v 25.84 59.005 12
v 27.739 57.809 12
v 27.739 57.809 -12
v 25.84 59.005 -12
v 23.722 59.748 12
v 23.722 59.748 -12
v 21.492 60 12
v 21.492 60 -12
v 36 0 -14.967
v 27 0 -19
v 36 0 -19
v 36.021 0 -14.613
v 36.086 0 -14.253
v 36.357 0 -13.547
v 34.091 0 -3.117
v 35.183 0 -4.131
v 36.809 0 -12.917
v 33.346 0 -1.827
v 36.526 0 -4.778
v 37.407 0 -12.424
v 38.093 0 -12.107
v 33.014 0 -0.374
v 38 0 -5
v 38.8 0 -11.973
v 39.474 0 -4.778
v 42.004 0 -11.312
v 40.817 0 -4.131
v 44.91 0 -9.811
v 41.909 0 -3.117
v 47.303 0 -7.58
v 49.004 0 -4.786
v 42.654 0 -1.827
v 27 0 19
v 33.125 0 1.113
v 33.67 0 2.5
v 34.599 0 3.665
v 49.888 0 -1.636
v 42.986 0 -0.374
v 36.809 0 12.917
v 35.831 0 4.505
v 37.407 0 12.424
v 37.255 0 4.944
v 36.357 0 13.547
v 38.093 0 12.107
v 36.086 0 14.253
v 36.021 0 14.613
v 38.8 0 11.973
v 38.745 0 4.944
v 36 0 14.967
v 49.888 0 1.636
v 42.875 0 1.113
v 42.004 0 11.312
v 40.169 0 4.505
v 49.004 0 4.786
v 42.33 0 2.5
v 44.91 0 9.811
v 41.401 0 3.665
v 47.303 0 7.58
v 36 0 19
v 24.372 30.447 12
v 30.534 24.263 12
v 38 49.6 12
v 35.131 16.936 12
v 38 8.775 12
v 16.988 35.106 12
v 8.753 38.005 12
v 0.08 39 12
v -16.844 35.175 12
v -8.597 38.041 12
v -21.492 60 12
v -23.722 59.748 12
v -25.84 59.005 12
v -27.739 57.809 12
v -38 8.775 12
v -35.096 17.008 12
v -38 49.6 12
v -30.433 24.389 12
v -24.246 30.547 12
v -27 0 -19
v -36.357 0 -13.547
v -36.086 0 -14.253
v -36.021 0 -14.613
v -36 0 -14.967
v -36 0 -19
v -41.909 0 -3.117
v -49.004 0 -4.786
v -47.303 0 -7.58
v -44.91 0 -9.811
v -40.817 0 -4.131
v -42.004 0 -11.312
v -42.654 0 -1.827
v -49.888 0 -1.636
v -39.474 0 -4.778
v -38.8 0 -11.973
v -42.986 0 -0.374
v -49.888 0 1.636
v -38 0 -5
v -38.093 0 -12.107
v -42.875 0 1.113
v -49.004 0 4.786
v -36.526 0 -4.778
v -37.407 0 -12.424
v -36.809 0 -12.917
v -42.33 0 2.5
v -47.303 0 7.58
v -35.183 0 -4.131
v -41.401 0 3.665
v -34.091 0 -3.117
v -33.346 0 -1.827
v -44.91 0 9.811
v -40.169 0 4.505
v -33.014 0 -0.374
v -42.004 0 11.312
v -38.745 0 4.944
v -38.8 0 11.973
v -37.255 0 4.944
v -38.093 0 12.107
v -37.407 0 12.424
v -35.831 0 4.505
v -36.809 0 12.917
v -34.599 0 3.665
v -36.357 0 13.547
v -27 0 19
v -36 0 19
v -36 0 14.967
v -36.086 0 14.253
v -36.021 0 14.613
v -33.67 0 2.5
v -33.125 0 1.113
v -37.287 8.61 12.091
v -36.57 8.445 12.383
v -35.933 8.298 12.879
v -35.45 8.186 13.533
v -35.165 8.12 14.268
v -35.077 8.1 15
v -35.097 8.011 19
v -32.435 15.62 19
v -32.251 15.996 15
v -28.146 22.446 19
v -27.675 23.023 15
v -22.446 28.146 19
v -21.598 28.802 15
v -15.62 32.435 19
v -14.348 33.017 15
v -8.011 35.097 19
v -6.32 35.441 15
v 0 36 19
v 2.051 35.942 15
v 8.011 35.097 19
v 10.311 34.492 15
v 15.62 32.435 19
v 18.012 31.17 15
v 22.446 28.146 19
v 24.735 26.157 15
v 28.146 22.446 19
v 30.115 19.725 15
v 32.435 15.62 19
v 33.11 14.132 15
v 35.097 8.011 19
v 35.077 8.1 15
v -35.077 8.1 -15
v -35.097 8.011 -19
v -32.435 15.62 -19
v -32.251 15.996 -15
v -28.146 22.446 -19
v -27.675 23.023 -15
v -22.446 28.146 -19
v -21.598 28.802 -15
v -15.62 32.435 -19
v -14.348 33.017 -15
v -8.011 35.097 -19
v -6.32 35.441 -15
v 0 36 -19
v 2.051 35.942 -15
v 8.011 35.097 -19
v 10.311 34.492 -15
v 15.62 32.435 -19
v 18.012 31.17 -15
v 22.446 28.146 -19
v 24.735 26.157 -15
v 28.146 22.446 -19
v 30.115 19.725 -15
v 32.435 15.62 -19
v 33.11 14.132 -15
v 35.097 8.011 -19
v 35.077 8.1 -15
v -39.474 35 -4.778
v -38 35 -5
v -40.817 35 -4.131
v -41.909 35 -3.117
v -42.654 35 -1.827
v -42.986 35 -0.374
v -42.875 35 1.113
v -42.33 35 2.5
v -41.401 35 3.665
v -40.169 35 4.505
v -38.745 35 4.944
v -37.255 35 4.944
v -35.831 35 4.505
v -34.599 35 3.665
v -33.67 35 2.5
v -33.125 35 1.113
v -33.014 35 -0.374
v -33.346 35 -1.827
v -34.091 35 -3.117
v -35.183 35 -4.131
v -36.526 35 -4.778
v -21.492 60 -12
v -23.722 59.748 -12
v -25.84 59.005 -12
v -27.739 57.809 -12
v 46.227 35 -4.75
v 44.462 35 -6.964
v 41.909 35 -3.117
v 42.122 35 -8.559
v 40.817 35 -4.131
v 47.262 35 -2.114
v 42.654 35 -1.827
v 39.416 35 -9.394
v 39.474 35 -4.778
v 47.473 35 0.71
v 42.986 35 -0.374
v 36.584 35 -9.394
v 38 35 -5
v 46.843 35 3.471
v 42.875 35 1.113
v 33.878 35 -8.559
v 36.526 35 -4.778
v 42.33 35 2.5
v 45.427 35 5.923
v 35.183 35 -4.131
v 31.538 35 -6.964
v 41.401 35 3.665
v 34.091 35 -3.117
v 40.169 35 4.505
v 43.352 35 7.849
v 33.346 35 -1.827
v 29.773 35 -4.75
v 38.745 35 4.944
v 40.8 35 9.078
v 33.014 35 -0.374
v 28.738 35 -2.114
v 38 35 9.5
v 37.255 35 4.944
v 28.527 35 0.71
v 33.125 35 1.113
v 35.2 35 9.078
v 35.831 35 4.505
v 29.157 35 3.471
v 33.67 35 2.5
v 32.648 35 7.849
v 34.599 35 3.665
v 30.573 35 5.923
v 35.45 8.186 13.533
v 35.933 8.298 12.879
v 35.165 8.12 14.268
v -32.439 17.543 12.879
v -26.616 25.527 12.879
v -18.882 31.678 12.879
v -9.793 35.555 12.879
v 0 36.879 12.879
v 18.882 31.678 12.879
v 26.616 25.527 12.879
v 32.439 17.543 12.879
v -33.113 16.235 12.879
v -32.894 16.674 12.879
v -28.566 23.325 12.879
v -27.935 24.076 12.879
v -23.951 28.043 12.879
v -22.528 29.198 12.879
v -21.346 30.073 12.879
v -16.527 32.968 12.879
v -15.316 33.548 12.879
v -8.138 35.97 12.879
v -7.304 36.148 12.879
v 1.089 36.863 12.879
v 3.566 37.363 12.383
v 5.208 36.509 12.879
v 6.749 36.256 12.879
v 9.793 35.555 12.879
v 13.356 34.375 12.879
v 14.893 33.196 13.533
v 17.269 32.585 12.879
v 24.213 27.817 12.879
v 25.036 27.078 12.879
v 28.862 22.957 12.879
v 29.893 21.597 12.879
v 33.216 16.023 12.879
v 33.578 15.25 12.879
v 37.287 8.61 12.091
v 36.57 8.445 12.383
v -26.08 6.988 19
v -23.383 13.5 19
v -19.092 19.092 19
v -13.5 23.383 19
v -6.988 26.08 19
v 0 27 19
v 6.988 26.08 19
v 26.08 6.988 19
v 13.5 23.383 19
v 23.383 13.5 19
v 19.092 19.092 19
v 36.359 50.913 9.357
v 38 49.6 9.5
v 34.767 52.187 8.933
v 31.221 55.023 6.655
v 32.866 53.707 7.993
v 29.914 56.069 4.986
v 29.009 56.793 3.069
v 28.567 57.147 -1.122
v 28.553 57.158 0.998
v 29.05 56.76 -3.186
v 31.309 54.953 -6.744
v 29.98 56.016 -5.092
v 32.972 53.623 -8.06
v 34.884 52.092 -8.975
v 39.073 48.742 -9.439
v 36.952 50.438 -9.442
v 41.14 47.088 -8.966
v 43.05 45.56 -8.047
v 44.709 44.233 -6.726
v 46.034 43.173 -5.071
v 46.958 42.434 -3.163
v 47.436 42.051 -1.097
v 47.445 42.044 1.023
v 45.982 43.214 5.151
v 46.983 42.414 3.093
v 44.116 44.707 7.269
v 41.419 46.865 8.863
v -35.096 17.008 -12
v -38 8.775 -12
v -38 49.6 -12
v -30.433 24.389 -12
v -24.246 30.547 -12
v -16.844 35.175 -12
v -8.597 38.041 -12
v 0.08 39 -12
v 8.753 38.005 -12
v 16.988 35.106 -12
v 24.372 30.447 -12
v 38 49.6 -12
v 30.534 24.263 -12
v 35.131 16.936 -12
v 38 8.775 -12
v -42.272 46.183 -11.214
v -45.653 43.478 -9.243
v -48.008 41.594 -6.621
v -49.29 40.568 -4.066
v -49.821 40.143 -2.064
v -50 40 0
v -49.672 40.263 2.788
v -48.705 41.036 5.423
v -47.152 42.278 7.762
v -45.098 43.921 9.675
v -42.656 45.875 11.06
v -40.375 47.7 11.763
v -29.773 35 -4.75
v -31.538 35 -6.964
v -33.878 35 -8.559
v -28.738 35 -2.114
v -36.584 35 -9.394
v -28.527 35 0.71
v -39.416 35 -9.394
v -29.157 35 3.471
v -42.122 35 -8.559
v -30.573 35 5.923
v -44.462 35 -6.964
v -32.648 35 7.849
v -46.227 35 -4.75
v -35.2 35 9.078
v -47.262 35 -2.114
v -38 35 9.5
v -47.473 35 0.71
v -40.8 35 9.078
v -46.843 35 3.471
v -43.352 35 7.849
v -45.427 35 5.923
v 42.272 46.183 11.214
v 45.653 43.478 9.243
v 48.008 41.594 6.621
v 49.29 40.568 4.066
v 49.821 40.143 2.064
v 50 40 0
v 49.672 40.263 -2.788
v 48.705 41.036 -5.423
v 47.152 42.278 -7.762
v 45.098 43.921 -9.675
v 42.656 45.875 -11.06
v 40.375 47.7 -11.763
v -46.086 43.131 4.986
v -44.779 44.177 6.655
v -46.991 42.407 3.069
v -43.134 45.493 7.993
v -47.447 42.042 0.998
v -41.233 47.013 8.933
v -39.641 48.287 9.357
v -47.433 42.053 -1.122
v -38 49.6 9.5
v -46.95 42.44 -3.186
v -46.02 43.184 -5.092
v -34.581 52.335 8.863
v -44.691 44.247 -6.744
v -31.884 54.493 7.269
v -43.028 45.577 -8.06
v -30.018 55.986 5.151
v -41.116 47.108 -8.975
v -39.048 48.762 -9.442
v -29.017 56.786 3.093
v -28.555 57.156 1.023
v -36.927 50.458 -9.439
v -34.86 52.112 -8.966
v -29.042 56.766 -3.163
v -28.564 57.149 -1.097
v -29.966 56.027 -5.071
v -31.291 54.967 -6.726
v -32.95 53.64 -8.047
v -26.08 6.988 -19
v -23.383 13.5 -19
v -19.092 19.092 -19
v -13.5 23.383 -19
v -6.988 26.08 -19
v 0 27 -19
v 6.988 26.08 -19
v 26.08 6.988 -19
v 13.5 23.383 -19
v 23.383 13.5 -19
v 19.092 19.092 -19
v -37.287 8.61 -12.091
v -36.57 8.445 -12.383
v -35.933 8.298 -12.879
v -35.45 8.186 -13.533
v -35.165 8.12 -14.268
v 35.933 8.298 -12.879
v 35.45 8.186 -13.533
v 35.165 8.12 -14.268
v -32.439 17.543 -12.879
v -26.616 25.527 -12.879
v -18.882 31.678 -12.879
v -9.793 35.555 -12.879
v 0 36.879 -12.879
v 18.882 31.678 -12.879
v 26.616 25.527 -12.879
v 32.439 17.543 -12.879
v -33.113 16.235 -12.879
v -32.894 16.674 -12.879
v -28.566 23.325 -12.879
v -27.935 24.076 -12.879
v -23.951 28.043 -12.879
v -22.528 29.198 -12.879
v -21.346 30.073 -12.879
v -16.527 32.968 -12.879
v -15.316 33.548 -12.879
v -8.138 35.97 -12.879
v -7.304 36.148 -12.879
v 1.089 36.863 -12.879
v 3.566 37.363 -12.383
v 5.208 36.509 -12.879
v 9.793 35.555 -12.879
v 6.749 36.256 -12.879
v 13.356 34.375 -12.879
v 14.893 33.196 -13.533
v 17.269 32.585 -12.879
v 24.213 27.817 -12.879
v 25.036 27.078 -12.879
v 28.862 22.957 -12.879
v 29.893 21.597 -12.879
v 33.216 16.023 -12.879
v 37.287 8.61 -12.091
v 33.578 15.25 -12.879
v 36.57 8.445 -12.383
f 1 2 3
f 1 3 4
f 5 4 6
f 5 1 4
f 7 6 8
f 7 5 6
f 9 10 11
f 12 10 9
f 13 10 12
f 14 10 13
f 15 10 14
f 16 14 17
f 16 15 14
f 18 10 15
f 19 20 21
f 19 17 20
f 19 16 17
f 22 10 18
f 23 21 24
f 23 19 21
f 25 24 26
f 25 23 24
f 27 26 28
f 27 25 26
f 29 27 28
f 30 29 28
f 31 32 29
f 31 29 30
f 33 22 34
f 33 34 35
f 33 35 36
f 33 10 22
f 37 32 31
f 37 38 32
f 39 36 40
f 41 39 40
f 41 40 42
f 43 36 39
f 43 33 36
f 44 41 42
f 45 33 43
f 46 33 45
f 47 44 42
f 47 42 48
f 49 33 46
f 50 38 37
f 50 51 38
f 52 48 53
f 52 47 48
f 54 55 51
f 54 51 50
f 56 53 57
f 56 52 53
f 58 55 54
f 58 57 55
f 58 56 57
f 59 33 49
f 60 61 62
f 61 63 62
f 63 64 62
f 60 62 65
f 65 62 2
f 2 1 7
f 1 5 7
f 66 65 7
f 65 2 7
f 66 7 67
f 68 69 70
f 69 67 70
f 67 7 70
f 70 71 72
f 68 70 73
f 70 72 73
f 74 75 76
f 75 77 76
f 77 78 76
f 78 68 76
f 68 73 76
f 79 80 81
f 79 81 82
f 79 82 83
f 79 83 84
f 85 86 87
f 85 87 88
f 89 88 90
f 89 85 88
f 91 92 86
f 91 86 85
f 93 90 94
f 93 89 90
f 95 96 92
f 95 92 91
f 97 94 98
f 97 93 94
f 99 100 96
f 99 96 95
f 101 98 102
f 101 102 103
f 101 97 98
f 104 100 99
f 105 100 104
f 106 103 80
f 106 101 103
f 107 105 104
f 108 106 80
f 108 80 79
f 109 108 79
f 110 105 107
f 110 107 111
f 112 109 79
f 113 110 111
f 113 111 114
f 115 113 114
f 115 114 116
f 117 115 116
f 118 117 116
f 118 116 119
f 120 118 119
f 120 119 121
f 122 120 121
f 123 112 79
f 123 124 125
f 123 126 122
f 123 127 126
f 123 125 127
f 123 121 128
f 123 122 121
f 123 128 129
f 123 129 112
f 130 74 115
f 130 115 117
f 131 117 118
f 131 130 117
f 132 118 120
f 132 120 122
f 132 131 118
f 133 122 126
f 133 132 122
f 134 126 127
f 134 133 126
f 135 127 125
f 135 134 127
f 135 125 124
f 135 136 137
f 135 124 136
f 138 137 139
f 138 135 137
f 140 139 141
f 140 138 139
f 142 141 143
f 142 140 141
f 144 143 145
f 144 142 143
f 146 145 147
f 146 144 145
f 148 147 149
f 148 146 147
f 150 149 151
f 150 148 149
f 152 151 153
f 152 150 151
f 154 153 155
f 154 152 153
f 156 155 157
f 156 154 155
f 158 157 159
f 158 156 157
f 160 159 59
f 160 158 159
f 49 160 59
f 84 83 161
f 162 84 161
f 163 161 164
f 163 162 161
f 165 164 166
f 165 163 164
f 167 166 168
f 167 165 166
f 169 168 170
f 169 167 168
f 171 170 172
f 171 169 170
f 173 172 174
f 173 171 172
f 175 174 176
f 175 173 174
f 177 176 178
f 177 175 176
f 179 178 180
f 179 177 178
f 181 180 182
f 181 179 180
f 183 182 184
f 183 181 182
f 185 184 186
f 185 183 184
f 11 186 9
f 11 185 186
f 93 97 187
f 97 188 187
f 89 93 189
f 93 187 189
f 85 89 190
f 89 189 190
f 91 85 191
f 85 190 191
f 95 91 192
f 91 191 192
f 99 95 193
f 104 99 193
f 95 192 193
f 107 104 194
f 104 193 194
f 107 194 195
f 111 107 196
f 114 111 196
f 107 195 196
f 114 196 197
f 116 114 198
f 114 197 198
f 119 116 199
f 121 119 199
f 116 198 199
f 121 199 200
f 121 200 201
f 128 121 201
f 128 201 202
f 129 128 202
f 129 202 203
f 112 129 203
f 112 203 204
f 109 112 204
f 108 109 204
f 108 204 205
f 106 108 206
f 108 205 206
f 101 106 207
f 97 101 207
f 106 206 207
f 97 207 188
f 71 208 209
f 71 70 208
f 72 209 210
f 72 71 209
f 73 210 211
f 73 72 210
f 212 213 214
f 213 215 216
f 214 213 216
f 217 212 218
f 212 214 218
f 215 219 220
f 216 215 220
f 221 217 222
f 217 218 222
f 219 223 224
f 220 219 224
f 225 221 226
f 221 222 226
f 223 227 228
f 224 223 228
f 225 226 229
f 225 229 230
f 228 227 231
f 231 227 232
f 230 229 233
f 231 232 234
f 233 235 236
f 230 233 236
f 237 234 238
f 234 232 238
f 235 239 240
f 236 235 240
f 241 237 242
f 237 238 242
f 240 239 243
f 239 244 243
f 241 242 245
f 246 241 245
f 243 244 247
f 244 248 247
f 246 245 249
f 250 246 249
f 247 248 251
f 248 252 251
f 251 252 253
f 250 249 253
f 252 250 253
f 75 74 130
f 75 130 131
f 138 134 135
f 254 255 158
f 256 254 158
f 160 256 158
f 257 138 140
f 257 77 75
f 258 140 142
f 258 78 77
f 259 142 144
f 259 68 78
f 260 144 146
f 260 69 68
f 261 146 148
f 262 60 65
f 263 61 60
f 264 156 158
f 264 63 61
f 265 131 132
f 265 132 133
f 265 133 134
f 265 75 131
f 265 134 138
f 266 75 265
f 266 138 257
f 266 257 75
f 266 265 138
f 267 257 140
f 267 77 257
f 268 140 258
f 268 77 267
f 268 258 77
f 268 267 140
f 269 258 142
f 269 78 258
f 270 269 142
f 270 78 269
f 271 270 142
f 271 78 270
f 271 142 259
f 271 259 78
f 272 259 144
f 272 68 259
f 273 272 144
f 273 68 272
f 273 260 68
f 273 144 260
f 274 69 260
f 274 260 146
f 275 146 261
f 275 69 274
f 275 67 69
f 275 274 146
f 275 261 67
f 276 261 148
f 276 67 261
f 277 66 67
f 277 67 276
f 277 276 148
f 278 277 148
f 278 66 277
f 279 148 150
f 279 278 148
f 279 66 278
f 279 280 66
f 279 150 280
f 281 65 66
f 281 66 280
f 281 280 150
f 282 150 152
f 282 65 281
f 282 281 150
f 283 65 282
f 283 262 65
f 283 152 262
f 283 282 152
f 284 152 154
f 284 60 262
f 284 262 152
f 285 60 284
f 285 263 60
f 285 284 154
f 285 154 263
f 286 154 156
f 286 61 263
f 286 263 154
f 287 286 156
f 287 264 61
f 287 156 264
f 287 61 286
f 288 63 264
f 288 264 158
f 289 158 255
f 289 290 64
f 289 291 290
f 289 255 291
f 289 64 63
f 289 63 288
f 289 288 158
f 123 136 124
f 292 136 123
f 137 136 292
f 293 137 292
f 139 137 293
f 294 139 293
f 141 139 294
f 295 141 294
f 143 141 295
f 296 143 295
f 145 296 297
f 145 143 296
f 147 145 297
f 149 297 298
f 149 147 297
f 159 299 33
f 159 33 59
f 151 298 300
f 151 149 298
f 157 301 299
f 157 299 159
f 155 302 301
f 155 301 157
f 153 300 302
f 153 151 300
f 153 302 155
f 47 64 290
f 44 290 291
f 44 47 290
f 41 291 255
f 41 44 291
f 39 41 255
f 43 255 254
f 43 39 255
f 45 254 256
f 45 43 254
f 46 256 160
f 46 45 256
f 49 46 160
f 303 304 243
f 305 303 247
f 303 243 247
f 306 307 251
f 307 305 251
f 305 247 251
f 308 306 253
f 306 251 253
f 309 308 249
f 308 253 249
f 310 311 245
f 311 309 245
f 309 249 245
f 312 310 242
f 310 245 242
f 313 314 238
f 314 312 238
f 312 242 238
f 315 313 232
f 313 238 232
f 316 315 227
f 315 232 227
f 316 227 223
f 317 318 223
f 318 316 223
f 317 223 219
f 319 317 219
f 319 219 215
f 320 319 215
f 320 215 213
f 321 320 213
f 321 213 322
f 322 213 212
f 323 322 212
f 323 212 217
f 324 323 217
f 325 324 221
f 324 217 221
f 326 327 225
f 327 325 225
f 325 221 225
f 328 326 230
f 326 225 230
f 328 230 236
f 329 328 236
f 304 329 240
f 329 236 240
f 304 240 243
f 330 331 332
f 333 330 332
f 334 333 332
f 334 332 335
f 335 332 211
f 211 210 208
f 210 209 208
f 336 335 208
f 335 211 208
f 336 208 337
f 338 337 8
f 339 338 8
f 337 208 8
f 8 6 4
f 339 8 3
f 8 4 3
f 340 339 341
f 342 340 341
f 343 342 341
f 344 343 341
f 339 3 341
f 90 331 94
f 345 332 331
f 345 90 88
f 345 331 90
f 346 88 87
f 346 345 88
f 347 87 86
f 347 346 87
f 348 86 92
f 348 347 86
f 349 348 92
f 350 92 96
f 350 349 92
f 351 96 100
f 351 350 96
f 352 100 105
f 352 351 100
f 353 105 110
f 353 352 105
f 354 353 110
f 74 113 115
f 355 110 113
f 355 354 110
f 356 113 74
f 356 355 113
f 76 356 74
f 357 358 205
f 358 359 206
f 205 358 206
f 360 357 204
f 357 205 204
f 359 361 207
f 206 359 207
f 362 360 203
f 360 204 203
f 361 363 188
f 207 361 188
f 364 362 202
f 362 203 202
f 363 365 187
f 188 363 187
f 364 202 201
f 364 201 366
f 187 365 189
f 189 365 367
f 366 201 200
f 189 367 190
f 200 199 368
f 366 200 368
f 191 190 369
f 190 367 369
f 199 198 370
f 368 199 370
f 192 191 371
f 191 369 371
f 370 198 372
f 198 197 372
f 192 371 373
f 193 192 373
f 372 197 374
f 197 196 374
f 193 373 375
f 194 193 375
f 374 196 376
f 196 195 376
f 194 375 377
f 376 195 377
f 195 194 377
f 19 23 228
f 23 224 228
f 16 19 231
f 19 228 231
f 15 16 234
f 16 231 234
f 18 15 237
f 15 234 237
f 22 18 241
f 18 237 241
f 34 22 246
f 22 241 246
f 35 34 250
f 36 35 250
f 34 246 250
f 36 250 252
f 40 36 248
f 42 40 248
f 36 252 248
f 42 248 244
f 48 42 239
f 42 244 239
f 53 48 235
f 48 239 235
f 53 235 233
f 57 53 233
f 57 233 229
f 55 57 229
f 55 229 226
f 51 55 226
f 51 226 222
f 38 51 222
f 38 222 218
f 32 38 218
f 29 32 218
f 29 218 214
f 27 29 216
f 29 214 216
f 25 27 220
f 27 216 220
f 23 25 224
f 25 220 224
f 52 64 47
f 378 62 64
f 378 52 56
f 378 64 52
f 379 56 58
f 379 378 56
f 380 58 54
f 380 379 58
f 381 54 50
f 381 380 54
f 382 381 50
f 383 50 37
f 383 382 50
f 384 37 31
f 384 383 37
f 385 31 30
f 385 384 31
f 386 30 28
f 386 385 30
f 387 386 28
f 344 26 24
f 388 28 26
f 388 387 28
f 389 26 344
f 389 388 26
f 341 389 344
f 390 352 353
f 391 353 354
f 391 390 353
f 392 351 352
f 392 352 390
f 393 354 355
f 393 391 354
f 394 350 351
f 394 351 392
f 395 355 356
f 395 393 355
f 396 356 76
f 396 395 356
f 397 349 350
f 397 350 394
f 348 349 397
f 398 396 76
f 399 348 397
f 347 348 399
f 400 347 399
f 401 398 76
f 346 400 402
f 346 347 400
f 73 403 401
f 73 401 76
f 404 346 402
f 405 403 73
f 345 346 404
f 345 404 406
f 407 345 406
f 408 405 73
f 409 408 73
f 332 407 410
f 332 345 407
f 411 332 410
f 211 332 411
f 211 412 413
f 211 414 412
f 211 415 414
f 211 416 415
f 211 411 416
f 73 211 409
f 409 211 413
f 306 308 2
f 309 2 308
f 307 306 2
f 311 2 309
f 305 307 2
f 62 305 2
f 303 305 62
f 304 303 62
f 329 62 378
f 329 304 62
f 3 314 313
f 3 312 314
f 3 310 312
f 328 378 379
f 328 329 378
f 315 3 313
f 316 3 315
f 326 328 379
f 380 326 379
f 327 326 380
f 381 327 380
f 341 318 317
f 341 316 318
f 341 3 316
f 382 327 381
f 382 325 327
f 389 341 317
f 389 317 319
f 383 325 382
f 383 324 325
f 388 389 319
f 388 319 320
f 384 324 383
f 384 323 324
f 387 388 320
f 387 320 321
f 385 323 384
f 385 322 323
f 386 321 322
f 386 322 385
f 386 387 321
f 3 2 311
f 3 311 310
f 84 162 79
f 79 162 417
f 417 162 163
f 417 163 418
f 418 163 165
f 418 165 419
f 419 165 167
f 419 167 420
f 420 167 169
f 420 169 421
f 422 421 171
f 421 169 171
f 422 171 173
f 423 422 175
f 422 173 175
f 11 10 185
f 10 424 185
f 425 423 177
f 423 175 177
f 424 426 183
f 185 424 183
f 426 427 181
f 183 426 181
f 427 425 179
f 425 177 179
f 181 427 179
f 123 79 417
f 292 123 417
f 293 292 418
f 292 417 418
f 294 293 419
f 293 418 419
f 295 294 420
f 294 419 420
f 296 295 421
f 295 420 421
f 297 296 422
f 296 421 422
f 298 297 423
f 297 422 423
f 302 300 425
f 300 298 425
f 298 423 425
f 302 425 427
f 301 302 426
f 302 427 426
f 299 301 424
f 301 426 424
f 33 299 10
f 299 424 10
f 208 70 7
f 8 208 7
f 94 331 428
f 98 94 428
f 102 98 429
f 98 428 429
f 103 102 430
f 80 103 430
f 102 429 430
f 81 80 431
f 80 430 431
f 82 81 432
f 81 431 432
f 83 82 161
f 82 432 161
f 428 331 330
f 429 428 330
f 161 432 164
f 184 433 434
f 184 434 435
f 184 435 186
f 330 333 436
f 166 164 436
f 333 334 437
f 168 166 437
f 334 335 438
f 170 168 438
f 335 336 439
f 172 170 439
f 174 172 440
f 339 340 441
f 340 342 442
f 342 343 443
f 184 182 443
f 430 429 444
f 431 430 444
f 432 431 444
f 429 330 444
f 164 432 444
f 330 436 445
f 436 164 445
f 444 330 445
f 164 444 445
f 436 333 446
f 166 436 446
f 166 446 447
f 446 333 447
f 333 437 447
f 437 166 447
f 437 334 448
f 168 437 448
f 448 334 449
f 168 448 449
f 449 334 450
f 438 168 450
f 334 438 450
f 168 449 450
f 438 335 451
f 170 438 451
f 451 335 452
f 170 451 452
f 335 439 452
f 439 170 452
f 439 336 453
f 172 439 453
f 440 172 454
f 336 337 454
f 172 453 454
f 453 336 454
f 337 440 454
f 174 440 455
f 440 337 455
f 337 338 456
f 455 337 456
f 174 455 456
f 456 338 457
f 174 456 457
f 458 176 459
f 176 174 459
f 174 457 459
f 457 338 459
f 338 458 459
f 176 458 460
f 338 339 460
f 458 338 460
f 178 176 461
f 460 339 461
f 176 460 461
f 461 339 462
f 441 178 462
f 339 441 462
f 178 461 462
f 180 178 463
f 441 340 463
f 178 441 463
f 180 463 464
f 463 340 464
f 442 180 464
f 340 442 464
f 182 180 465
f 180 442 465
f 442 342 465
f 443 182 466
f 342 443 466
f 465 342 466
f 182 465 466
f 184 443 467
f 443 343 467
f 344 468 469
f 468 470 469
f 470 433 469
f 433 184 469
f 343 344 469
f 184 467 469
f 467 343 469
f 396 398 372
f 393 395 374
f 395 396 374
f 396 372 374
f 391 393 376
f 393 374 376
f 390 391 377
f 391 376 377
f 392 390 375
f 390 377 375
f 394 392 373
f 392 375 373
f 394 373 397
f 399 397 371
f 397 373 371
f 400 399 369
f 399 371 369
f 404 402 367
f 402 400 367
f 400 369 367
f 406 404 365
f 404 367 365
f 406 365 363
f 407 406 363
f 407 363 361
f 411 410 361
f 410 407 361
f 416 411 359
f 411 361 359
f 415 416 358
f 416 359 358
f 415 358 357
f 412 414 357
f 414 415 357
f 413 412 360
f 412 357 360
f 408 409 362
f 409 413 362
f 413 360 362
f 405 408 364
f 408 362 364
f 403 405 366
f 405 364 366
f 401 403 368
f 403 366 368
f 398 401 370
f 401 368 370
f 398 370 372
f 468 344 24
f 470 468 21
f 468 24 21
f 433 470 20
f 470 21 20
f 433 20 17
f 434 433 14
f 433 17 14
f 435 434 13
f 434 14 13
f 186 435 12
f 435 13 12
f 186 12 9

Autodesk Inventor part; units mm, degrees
ref_plane "YZ Plane" through (0, 0, 0) normal (1, 0, 0) x (0, 1, 0)
ref_plane "XZ Plane" through (0, 0, 0) normal (0, 1, 0) x (-1, 0, 0)
sketch "Sketch1" plane through (0, 0, 0) normal (0, 0, 1) x (1, 0, 0)
  arc A0 (36, 0) -> (-36, 0) centre (0, 0) ccw
  arc A1 (27, 0) -> (-27, 0) centre (0, 0) ccw
  line L0 (-36, 0) -> (-27, 0)
  line L1 (27, 0) -> (36, 0)
  dimension "d0" = 72
  dimension "d1" = 54
extrude "Extrusion1" add sketch "Sketch1" along normal mid plane 38
ref_plane "Work Plane1" through (27, 60, 19) normal (0, -1, 0) x (1, 0, 0)
sketch "Sketch2" plane through (27, 60, 19) normal (0, -1, 0) x (1, 0, 0)
  line L0 (11, -19) -> (-65, -19) construction
  line L1 (11, -7) -> (-65, -7)
  line L2 (-65, -31) -> (11, -31)
  arc A0 (11, -31) -> (11, -7) centre (11, -19) ccw
  arc A1 (-65, -7) -> (-65, -31) centre (-65, -19) ccw
  line L3 (0, -38) -> (-54, -38) construction
  line L4 (9, 0) -> (9, -38) construction
  point P0 (-27, -19)
  point P1 (-27, -19)
  dimension "d5" = 76
  dimension "d6" = 12
extrude "Extrusion2" add sketch "Sketch2" along normal up to surface (60 mm away)
sketch "Sketch3" plane through (0, 0, 0) normal (0, 0, 1) x (1, 0, 0)
  arc A0 (27, 0) -> (-27, 0) centre (0, 0) ccw projected
  line L0 (27, 0) -> (-27, 0) projected
extrude "Extrusion3" cut sketch "Sketch3" along normal through all both and the other way through all
sketch "Sketch4" plane through (0, 0, 0) normal (0, 0, 1) x (1, 0, 0)
  line L0 (38, 60) -> (-38, 60) projected
  line L1 (-50, 60) -> (-38, 60) projected
  line L2 (-50, 60) -> (-50, 0) projected
  line L3 (-50, 40) -> (-25, 60)
  line L4 (-50, 60) -> (-50, 40)
  point P0 (0, 0)
  dimension "d11" = 25
  dimension "d12" = 20
extrude "Extrusion4" cut sketch "Sketch4" along normal through all both and the other way through all
mirror "Mirror1" about plane through (0, 0, 0) normal (1, 0, 0) of "Extrusion4"
fillet "Fillet1" radius 3 2 edges at (0, 36, -12) (0, 36, 12)
fillet "Fillet2" radius 10 2 edges at (-25, 60, 0) (25, 60, 0)
sketch "Sketch5" plane through (-36, 0, 19) normal (0, -1, 0) x (1, 0, 0)
  arc A0 (-2.8, -7.0267) -> (-2.8, -30.9733) centre (-2, -19) ccw projected
  point P0 (36, -19)
hole "Hole1" at (-38, 0, 0) direction (0, 1, 0) diameter 10 end through all
sketch "Sketch6" plane through (27, 0, -19) normal (0, -1, 0) x (1, 0, 0)
  arc A0 (11.8, 7.0267) -> (11.8, 30.9733) centre (11, 19) ccw projected
  point P0 (-27, 19)
hole "Hole2" at (38, 0, 0) direction (0, 1, 0) diameter 10 end through all
sketch "Sketch7" plane through (27, 60, 19) normal (0, 1, 0) x (1, 0, 0)
  circle A0 centre (-65, 19) radius 5 projected
  circle A1 centre (11, 19) radius 5 projected
  circle A2 centre (-65, 19) radius 5 projected
  point P0 (-27, 19)
hole "Hole3" at (-38, 60, 0) at (38, 60, 0) direction (0, -1, 0) diameter 10 end through all counterbore diameter 19 counterbore depth 25
equation "\"d22\" = Thickness"
equation "\"BendRadius\" = Thickness"
equation "\"BendReliefWidth\" = Thickness"
equation "\"BendReliefDepth\" = 0.5 * Thickness"
equation "\"CornerReliefSize\" = 4 * Thickness"
equation "\"MinimumRemnant\" = 2 * Thickness"
equation "\"TransitionRadius\" = BendRadius"
equation "\"JacobiRadiusSize\" = BendRadius"
equation "\"GapSize\" = Thickness"
equation "\"Thickness\" = 0.5"
properties part number "Part4 CONNECTING CAP" material "Stainless Steel"
